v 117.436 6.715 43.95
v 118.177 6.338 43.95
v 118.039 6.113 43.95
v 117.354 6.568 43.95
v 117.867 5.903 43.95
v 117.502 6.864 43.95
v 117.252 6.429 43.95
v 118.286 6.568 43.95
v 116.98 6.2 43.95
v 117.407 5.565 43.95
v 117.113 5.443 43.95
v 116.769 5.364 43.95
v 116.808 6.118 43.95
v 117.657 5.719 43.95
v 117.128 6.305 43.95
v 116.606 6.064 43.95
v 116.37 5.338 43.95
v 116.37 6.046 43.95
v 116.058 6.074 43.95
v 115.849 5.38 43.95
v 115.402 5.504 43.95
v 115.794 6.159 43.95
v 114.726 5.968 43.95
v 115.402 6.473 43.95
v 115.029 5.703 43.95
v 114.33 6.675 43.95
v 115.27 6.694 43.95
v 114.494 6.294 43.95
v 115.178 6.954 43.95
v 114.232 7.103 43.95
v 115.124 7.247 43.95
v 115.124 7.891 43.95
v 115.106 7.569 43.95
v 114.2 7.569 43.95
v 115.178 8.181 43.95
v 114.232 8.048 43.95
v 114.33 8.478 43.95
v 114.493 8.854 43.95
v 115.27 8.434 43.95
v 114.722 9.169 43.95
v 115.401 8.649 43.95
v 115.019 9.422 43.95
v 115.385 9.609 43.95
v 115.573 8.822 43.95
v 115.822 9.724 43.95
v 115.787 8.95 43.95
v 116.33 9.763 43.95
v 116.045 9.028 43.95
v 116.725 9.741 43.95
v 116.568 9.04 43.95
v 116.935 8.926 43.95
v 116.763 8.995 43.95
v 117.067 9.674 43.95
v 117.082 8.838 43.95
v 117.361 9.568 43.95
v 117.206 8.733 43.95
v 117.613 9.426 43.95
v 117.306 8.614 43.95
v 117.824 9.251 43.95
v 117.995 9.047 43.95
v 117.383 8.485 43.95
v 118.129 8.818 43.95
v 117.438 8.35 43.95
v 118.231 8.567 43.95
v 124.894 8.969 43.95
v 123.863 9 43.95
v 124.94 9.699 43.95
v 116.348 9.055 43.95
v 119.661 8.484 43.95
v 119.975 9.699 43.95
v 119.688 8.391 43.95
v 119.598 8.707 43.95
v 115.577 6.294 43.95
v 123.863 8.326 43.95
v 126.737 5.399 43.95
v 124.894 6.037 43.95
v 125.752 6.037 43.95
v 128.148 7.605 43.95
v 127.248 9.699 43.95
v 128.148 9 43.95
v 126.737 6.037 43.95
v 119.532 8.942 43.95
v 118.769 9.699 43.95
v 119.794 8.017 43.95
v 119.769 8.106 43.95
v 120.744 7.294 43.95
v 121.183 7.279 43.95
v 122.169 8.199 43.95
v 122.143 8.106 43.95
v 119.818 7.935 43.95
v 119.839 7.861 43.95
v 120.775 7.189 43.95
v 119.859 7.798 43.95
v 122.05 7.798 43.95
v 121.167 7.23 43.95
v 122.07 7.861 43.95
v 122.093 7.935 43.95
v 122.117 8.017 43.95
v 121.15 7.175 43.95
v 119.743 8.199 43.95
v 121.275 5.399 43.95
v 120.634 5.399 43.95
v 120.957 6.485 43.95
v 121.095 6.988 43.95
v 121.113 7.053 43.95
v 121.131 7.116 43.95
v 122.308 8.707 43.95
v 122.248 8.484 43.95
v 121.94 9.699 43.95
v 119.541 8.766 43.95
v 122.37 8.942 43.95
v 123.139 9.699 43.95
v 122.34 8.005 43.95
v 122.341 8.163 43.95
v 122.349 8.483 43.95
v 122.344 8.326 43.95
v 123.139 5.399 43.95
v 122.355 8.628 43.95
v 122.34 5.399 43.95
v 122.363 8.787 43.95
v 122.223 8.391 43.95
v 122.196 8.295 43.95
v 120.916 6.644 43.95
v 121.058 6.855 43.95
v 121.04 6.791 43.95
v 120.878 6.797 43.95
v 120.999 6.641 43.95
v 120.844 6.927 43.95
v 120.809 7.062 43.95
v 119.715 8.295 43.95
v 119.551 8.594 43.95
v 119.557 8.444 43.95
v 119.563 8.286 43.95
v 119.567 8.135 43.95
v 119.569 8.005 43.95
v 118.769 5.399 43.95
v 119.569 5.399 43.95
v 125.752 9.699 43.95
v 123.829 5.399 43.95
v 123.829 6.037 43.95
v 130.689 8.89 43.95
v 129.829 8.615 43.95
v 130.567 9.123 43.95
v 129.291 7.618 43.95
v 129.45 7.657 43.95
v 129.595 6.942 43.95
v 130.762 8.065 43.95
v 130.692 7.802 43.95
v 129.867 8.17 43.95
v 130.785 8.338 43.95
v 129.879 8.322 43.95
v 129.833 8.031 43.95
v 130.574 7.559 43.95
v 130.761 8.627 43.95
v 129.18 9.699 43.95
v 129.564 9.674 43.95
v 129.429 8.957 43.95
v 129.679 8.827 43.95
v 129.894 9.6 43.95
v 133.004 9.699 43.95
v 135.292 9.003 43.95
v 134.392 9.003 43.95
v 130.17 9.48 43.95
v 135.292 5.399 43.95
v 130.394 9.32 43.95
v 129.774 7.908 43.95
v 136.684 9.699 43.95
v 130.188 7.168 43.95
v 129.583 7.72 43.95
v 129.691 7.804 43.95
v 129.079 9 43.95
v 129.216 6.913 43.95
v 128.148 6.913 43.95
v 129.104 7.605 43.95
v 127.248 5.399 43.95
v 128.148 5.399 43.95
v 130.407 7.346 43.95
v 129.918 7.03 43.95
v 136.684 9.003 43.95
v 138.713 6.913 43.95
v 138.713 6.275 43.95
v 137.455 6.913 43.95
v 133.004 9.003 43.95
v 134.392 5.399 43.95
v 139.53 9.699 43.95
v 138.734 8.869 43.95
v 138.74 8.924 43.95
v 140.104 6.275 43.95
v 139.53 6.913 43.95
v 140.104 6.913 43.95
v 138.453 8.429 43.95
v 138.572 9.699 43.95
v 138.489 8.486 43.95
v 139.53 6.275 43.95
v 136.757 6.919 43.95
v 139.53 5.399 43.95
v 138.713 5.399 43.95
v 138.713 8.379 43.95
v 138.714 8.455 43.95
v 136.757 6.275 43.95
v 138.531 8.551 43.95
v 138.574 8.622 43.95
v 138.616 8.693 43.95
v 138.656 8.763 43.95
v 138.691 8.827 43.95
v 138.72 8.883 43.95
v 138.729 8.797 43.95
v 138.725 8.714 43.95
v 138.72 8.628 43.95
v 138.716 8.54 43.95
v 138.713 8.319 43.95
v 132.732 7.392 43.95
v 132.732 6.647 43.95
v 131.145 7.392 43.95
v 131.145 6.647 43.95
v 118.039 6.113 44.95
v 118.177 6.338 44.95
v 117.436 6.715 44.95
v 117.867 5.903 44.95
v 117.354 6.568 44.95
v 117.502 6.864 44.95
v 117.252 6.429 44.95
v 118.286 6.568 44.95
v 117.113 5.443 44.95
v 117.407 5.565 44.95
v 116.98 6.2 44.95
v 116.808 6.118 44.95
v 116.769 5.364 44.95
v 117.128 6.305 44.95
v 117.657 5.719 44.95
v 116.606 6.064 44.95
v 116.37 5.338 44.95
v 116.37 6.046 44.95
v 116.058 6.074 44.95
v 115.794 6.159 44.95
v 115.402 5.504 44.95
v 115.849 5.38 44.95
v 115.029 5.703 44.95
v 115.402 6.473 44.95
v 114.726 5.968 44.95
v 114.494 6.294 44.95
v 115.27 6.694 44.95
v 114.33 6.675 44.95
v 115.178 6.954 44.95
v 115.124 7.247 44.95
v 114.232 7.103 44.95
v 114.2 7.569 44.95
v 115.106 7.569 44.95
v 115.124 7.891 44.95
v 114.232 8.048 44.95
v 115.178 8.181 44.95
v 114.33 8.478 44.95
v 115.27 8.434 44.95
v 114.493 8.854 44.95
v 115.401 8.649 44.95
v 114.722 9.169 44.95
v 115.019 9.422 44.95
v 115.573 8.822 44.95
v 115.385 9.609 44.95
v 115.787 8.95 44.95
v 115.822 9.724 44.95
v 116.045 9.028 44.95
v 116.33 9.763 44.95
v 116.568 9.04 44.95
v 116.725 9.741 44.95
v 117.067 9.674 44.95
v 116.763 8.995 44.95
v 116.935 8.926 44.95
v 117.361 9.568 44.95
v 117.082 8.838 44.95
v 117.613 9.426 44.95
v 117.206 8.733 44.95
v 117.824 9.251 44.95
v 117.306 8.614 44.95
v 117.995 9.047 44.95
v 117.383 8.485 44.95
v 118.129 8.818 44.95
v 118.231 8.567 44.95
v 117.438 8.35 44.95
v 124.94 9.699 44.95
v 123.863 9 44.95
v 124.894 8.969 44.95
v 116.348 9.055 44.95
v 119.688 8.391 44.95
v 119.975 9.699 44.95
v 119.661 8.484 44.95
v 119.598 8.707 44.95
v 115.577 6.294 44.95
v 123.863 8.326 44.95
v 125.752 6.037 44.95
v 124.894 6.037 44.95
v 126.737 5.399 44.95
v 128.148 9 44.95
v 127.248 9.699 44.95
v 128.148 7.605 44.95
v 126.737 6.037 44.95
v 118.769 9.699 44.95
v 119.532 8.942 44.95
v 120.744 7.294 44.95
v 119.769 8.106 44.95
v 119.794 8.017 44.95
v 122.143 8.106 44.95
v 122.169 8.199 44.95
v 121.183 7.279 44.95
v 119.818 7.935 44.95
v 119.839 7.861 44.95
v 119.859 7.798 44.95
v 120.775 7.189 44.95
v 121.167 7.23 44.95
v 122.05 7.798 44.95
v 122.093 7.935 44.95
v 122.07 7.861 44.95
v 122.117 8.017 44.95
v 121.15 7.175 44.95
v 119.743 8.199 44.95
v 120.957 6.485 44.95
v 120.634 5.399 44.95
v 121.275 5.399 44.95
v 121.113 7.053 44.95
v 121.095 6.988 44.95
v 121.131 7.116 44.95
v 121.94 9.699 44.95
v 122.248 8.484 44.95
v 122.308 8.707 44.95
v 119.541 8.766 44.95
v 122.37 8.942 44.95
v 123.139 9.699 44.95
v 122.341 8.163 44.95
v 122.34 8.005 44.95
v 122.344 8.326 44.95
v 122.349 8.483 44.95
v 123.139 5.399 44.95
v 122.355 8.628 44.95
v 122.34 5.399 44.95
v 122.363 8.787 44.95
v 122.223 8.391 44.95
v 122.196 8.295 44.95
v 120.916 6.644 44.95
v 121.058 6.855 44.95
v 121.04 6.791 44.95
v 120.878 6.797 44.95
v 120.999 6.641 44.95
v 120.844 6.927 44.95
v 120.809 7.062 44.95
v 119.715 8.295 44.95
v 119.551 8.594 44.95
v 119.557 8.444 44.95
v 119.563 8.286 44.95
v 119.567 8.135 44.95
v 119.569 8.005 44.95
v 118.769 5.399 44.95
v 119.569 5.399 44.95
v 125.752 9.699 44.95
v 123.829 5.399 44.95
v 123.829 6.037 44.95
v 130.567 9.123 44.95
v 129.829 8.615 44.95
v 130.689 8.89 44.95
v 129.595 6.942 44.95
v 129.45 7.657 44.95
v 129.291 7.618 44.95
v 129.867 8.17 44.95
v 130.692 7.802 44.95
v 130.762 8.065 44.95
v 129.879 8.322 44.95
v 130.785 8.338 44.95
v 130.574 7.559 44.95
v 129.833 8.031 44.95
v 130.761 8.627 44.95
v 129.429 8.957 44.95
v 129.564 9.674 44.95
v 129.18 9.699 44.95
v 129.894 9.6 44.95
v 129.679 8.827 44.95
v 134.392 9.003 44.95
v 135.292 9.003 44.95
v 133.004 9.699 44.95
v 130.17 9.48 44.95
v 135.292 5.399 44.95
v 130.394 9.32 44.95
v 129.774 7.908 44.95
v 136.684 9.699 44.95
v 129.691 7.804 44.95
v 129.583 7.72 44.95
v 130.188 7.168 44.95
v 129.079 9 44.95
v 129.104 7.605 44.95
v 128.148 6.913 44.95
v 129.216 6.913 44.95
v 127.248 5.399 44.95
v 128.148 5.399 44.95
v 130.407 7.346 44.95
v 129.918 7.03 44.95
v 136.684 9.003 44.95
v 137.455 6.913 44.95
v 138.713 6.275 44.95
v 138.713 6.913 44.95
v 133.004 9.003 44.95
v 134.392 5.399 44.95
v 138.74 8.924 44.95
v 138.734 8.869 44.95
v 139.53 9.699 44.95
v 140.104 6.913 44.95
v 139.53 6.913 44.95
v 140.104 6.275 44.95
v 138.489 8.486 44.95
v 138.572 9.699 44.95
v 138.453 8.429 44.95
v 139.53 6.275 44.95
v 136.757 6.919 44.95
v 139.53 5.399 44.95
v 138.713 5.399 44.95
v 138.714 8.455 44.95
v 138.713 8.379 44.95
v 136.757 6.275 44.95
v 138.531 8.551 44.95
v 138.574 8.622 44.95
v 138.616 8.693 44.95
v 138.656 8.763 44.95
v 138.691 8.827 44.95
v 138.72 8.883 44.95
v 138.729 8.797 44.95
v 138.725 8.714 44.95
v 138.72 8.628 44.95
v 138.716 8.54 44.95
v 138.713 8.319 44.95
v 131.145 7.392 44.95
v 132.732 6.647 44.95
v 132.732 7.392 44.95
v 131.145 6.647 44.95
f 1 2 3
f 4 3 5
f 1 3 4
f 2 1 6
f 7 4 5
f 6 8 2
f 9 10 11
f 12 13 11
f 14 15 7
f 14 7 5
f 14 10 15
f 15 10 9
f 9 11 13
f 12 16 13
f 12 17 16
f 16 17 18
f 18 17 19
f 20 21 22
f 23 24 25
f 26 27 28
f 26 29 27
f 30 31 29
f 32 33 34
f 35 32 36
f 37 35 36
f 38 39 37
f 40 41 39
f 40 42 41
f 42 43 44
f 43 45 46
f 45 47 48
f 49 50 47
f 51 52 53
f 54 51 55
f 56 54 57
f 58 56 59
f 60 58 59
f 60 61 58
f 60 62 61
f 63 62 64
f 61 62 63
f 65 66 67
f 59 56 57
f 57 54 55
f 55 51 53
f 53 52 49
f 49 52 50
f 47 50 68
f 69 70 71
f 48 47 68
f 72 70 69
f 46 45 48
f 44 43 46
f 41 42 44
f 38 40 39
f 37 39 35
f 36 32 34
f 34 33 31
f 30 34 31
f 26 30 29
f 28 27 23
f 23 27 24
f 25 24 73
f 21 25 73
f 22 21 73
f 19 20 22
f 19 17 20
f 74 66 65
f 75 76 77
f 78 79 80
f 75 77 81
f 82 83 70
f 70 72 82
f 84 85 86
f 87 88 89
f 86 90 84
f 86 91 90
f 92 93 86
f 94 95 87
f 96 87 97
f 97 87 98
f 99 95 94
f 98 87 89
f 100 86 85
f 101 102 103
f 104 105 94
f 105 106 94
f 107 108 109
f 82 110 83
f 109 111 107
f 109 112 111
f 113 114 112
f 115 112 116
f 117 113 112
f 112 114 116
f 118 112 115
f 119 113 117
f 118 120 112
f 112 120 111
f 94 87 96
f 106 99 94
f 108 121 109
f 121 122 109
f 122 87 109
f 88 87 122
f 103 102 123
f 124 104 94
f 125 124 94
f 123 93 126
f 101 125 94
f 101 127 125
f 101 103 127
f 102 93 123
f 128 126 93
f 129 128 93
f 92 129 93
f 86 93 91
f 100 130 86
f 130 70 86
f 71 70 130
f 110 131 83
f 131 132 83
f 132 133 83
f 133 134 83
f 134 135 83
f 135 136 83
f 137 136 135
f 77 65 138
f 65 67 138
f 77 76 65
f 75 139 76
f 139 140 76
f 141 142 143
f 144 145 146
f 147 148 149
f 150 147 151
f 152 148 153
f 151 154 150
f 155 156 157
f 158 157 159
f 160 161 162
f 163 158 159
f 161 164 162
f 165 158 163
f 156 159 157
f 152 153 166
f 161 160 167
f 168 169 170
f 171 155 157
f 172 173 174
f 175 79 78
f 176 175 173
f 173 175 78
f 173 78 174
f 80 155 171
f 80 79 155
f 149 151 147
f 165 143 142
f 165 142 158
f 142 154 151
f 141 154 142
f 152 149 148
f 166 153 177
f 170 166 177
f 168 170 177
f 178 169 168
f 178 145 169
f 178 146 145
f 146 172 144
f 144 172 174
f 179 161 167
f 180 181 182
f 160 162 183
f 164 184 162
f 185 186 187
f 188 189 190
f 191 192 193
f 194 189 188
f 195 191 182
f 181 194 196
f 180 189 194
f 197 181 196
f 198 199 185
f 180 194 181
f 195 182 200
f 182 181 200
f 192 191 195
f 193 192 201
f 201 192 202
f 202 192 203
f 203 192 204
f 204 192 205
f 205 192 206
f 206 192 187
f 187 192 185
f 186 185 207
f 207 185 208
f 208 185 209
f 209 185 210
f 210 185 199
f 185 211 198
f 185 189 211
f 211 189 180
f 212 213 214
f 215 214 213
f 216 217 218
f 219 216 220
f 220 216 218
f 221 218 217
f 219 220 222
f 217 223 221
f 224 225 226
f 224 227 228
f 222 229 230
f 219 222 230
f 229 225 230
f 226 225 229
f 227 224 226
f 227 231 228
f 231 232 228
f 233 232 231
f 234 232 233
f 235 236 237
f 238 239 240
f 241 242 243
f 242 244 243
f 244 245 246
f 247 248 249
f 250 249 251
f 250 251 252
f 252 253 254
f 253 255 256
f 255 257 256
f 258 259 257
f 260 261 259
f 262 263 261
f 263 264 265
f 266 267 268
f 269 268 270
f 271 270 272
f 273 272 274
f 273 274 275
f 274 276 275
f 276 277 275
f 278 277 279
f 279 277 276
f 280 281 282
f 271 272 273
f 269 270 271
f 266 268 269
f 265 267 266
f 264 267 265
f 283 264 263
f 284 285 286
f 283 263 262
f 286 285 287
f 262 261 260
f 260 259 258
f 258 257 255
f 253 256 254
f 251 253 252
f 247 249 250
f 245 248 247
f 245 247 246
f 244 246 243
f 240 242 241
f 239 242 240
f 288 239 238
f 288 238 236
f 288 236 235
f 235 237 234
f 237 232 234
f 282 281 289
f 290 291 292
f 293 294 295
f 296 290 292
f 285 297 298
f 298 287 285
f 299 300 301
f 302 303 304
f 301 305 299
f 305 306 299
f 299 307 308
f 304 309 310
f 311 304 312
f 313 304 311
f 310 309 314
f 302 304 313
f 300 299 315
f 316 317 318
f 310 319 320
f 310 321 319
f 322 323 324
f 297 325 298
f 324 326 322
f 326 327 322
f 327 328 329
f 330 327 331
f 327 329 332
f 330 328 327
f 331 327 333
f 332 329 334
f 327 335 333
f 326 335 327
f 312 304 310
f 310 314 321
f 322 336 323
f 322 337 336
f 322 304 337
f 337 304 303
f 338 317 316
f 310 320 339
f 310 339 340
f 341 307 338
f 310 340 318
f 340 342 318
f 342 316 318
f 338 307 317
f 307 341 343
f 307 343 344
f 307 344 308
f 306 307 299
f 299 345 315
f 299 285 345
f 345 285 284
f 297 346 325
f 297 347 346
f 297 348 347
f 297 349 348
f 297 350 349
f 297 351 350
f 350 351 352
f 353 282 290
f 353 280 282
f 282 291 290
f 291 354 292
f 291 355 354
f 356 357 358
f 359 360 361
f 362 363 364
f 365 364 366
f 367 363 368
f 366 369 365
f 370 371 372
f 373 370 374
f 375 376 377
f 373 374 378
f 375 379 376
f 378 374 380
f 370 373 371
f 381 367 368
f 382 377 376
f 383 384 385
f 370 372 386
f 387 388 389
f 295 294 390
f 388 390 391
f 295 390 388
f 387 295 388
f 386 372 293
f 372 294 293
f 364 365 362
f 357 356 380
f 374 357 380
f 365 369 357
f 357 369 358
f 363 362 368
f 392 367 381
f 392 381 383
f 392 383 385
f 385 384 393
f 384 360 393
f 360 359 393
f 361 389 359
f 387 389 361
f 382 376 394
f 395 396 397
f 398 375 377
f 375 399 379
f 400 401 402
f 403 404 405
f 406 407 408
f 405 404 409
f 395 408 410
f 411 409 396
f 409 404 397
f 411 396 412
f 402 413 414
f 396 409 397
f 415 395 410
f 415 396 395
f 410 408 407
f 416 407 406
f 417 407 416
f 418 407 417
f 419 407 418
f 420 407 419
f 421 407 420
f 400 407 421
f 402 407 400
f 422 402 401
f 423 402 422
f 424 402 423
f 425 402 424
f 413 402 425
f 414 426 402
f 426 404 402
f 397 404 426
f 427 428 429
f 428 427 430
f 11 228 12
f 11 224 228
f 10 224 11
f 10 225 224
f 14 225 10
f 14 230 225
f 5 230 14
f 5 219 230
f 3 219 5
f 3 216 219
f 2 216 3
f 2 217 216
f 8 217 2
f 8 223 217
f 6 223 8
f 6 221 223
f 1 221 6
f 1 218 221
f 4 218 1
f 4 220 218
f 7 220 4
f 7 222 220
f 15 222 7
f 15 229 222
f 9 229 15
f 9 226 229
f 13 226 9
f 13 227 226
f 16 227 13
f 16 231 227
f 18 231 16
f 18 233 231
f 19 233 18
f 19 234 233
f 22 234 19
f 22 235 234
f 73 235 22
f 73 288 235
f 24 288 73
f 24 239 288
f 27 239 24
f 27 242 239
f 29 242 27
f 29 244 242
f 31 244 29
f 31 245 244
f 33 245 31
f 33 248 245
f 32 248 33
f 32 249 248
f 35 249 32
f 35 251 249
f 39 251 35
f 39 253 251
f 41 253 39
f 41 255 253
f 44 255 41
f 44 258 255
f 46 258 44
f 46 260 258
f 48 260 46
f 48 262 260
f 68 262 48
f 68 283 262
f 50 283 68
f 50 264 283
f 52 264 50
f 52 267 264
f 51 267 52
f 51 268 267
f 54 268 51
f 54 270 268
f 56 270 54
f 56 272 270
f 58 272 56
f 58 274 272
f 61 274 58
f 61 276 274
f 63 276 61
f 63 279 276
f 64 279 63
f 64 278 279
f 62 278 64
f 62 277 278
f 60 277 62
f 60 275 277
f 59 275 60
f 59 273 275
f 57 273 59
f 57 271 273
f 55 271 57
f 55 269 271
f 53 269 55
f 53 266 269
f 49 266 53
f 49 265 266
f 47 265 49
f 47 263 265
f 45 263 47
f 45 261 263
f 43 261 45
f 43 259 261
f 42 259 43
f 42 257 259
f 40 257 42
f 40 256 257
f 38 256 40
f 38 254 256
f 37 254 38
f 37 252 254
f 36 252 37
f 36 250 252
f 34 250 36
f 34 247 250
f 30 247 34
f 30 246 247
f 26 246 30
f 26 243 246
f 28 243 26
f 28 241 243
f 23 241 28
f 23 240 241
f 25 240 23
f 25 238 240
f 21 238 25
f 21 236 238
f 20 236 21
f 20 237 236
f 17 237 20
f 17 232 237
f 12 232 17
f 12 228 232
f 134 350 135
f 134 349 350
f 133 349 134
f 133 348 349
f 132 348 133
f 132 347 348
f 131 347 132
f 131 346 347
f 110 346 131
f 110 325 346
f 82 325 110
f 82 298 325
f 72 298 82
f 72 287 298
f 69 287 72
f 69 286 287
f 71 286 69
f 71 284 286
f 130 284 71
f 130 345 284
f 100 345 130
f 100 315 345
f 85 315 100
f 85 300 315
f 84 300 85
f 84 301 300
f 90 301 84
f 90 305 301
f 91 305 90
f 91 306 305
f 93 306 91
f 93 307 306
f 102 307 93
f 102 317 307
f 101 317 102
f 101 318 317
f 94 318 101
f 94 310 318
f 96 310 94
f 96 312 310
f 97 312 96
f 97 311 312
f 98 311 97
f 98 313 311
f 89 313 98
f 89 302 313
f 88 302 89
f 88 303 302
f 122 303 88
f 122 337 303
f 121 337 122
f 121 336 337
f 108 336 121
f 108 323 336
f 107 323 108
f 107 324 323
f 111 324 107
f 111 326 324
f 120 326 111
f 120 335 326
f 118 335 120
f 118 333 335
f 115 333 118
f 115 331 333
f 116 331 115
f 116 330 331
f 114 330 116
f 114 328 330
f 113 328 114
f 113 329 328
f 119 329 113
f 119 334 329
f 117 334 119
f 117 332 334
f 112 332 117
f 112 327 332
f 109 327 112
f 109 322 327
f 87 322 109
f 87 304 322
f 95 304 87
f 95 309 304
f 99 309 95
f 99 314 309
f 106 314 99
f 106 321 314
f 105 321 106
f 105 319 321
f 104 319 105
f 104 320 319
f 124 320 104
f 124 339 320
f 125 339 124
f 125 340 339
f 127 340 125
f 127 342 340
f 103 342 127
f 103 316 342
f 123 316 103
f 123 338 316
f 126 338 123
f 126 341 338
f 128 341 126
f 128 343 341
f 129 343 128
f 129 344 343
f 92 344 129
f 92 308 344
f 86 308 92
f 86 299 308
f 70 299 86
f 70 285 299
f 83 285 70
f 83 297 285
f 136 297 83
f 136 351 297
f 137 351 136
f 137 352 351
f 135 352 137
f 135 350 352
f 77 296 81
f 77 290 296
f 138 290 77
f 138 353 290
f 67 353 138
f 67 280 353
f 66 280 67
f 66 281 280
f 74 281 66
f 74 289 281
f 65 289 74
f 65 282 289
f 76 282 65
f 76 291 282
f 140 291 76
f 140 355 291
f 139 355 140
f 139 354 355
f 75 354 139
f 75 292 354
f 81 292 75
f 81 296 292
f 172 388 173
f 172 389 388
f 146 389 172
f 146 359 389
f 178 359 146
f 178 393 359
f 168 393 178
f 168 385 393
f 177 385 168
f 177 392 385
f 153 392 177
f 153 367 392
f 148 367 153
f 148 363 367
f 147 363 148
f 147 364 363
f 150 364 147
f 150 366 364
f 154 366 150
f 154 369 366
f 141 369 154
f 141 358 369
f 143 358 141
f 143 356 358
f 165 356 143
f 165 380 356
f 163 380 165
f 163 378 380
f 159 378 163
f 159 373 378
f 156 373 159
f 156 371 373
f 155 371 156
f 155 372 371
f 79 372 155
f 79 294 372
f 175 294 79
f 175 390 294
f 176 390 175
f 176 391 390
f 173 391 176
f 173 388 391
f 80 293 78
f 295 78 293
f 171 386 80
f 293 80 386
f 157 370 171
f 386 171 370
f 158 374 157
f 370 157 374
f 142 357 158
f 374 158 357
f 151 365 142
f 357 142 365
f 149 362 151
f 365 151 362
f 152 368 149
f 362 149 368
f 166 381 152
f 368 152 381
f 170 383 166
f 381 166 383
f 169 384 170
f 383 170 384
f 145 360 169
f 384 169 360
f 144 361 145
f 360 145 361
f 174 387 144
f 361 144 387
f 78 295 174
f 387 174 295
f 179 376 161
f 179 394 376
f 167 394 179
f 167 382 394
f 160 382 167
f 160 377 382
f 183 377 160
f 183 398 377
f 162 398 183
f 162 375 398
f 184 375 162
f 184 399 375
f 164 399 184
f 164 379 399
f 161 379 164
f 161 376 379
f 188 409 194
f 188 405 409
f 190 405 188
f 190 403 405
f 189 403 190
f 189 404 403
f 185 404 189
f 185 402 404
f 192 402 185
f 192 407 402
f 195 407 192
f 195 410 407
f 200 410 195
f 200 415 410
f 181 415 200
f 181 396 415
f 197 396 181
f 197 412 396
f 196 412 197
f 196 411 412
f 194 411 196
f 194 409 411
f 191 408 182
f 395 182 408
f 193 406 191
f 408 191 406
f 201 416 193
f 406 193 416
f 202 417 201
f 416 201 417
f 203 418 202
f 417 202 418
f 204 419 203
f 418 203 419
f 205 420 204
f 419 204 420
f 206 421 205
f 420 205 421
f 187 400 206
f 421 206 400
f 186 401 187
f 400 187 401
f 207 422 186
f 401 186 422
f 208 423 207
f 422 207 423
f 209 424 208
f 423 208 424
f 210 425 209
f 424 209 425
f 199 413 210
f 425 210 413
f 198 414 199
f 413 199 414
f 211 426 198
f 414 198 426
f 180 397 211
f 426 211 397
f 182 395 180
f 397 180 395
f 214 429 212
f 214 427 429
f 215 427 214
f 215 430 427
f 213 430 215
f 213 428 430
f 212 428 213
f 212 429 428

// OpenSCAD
// CM1P-T4 ID text, engraved 0.5 into the plate's top face (frame as cm1p_t3_freecad.py).
translate([127, 7.5, 43.95]) linear_extrude(1) text("CM1P-T4", size = 4.5, font = "Liberation Sans:style=Bold", halign = "center", valign = "center");
